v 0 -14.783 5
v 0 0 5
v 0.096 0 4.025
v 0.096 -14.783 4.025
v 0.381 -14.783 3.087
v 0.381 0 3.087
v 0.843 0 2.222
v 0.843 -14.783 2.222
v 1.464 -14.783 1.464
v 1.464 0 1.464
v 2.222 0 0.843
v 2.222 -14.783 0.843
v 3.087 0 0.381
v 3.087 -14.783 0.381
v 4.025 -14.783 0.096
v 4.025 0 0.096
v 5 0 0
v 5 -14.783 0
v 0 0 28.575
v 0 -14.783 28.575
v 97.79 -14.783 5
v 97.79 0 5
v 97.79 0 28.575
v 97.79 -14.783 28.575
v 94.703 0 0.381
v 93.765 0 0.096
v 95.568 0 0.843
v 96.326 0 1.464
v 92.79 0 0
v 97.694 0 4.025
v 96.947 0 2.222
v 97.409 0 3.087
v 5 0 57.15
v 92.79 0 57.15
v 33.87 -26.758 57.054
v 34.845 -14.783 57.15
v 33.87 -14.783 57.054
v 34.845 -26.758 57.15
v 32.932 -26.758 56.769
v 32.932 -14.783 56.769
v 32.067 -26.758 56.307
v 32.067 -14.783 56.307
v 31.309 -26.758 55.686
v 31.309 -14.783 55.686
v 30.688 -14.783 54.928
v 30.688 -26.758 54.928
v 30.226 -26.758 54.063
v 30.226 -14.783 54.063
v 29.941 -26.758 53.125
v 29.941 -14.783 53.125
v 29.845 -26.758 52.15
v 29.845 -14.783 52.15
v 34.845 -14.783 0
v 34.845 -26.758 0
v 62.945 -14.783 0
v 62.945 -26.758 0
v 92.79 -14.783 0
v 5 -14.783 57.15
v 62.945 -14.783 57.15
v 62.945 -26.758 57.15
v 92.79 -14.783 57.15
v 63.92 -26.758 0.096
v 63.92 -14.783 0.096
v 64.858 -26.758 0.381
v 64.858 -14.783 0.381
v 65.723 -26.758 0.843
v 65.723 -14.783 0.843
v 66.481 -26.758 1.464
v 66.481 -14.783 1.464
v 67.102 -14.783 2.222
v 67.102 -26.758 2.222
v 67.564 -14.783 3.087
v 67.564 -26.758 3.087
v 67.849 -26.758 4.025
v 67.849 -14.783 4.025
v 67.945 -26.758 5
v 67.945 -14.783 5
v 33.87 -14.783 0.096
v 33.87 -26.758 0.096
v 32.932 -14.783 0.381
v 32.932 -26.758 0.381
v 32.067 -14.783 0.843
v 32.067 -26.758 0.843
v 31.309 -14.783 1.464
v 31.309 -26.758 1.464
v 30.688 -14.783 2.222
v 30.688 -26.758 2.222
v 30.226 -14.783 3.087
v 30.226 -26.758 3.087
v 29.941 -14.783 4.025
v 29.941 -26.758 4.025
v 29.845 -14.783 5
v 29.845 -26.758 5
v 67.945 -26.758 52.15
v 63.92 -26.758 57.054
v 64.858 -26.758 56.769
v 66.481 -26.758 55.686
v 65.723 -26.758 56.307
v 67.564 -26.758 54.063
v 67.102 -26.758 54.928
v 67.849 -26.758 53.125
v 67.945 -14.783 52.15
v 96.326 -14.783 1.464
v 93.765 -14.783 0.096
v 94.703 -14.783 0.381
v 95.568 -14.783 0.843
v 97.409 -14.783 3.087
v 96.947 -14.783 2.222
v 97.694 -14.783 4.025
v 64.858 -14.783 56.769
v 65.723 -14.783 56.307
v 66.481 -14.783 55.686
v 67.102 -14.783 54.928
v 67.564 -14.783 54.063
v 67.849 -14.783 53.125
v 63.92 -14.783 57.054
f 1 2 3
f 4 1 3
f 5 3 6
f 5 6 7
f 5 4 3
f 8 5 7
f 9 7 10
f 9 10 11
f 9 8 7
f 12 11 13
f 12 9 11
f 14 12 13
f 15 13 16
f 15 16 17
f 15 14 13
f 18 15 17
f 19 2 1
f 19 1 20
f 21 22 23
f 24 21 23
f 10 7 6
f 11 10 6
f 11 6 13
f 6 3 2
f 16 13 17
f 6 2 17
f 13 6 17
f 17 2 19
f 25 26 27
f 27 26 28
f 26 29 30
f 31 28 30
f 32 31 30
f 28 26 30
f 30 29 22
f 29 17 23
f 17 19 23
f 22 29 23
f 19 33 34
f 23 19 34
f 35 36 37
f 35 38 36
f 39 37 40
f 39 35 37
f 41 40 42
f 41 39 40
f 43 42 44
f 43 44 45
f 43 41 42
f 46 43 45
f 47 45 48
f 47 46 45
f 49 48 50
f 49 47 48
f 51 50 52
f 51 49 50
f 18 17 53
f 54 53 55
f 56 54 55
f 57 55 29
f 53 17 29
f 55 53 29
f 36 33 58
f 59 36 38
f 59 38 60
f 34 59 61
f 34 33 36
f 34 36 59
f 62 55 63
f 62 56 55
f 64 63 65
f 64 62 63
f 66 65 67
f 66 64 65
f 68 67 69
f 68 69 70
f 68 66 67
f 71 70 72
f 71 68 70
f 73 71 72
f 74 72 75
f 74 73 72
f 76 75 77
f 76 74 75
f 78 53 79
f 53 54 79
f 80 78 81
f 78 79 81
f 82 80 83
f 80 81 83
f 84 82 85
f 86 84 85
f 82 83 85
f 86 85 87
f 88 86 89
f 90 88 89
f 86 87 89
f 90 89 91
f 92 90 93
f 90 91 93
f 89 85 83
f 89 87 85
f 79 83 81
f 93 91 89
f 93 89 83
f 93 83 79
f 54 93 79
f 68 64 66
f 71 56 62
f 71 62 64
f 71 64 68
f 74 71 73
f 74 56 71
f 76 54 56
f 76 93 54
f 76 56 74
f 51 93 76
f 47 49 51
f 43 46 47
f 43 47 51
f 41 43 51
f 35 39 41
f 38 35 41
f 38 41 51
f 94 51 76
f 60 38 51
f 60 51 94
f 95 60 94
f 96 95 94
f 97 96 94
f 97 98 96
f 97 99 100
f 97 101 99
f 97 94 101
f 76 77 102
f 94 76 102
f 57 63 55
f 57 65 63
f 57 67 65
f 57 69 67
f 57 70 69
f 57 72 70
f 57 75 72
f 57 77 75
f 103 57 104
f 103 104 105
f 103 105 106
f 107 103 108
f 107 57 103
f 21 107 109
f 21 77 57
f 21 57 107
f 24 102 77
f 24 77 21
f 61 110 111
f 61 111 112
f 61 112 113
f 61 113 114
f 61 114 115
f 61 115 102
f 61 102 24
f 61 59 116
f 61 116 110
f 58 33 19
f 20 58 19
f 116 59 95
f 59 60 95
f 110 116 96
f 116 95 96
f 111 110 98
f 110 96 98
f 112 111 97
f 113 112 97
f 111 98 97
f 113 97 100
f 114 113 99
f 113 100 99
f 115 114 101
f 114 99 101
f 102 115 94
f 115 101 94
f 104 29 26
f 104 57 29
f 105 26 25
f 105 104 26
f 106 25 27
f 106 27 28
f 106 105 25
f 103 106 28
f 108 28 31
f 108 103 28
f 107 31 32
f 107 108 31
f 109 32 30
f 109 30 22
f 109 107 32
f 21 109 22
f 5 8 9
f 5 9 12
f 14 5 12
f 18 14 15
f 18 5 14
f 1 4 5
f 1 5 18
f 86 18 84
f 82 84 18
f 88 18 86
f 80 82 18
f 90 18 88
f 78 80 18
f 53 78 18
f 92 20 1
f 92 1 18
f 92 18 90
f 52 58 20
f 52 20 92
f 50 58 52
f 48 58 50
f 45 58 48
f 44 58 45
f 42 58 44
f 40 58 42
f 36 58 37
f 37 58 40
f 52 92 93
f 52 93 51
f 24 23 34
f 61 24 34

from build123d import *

# Parameters (mm, degrees)
F0_W     = 97.79
F0_H     = 57.15
F1_DEPTH = 14.7828
F2_W     = 38.1
F2_H     = 57.15
F3_DEPTH = 11.97483
F4_R     = 5
F6_DEPTH = 26.75863


with BuildPart() as f1:
    # F0 (on Front) → F1 (new body)
    with BuildSketch(Plane.XZ):
        with Locations((48.895, 28.575)):
            Rectangle(F0_W, F0_H)
    extrude(amount=F1_DEPTH)

    # F2 (on face) → F3 (join)
    with BuildSketch(Plane.XZ.offset(14.7828)):
        with Locations((48.895, 28.575)):
            Rectangle(F2_W, F2_H)
    extrude(amount=F3_DEPTH)

    # F4
    f4_edges = [f1.edges().sort_by_distance(p)[0] for p in [
        (0, -7.3914, 0),
        (29.845, -20.770215, 0),
        (67.945, -20.770215, 0),
        (97.79, -7.3914, 0),
        (97.79, -7.3914, 57.15),
        (67.945, -20.770215, 57.15),
        (29.845, -20.770215, 57.15),
        (0, -7.3914, 57.15),
    ]]
    fillet(f4_edges, radius=F4_R)

    # F5 (on face) → F6 (cut, through all)
    with BuildSketch(Plane(origin=(0, 0, 0), x_dir=(-1, 0, 0), z_dir=(0, 1, 0))):
        Polygon((-97.79, 58.0248906387), (-97.79, 28.575), (-92.79, 57.15), align=None)
        Polygon((-5, 57.15), (0, 28.575), (0, 58.0248906387), align=None)
    extrude(amount=-F6_DEPTH, mode=Mode.SUBTRACT)


solid = f1.part
